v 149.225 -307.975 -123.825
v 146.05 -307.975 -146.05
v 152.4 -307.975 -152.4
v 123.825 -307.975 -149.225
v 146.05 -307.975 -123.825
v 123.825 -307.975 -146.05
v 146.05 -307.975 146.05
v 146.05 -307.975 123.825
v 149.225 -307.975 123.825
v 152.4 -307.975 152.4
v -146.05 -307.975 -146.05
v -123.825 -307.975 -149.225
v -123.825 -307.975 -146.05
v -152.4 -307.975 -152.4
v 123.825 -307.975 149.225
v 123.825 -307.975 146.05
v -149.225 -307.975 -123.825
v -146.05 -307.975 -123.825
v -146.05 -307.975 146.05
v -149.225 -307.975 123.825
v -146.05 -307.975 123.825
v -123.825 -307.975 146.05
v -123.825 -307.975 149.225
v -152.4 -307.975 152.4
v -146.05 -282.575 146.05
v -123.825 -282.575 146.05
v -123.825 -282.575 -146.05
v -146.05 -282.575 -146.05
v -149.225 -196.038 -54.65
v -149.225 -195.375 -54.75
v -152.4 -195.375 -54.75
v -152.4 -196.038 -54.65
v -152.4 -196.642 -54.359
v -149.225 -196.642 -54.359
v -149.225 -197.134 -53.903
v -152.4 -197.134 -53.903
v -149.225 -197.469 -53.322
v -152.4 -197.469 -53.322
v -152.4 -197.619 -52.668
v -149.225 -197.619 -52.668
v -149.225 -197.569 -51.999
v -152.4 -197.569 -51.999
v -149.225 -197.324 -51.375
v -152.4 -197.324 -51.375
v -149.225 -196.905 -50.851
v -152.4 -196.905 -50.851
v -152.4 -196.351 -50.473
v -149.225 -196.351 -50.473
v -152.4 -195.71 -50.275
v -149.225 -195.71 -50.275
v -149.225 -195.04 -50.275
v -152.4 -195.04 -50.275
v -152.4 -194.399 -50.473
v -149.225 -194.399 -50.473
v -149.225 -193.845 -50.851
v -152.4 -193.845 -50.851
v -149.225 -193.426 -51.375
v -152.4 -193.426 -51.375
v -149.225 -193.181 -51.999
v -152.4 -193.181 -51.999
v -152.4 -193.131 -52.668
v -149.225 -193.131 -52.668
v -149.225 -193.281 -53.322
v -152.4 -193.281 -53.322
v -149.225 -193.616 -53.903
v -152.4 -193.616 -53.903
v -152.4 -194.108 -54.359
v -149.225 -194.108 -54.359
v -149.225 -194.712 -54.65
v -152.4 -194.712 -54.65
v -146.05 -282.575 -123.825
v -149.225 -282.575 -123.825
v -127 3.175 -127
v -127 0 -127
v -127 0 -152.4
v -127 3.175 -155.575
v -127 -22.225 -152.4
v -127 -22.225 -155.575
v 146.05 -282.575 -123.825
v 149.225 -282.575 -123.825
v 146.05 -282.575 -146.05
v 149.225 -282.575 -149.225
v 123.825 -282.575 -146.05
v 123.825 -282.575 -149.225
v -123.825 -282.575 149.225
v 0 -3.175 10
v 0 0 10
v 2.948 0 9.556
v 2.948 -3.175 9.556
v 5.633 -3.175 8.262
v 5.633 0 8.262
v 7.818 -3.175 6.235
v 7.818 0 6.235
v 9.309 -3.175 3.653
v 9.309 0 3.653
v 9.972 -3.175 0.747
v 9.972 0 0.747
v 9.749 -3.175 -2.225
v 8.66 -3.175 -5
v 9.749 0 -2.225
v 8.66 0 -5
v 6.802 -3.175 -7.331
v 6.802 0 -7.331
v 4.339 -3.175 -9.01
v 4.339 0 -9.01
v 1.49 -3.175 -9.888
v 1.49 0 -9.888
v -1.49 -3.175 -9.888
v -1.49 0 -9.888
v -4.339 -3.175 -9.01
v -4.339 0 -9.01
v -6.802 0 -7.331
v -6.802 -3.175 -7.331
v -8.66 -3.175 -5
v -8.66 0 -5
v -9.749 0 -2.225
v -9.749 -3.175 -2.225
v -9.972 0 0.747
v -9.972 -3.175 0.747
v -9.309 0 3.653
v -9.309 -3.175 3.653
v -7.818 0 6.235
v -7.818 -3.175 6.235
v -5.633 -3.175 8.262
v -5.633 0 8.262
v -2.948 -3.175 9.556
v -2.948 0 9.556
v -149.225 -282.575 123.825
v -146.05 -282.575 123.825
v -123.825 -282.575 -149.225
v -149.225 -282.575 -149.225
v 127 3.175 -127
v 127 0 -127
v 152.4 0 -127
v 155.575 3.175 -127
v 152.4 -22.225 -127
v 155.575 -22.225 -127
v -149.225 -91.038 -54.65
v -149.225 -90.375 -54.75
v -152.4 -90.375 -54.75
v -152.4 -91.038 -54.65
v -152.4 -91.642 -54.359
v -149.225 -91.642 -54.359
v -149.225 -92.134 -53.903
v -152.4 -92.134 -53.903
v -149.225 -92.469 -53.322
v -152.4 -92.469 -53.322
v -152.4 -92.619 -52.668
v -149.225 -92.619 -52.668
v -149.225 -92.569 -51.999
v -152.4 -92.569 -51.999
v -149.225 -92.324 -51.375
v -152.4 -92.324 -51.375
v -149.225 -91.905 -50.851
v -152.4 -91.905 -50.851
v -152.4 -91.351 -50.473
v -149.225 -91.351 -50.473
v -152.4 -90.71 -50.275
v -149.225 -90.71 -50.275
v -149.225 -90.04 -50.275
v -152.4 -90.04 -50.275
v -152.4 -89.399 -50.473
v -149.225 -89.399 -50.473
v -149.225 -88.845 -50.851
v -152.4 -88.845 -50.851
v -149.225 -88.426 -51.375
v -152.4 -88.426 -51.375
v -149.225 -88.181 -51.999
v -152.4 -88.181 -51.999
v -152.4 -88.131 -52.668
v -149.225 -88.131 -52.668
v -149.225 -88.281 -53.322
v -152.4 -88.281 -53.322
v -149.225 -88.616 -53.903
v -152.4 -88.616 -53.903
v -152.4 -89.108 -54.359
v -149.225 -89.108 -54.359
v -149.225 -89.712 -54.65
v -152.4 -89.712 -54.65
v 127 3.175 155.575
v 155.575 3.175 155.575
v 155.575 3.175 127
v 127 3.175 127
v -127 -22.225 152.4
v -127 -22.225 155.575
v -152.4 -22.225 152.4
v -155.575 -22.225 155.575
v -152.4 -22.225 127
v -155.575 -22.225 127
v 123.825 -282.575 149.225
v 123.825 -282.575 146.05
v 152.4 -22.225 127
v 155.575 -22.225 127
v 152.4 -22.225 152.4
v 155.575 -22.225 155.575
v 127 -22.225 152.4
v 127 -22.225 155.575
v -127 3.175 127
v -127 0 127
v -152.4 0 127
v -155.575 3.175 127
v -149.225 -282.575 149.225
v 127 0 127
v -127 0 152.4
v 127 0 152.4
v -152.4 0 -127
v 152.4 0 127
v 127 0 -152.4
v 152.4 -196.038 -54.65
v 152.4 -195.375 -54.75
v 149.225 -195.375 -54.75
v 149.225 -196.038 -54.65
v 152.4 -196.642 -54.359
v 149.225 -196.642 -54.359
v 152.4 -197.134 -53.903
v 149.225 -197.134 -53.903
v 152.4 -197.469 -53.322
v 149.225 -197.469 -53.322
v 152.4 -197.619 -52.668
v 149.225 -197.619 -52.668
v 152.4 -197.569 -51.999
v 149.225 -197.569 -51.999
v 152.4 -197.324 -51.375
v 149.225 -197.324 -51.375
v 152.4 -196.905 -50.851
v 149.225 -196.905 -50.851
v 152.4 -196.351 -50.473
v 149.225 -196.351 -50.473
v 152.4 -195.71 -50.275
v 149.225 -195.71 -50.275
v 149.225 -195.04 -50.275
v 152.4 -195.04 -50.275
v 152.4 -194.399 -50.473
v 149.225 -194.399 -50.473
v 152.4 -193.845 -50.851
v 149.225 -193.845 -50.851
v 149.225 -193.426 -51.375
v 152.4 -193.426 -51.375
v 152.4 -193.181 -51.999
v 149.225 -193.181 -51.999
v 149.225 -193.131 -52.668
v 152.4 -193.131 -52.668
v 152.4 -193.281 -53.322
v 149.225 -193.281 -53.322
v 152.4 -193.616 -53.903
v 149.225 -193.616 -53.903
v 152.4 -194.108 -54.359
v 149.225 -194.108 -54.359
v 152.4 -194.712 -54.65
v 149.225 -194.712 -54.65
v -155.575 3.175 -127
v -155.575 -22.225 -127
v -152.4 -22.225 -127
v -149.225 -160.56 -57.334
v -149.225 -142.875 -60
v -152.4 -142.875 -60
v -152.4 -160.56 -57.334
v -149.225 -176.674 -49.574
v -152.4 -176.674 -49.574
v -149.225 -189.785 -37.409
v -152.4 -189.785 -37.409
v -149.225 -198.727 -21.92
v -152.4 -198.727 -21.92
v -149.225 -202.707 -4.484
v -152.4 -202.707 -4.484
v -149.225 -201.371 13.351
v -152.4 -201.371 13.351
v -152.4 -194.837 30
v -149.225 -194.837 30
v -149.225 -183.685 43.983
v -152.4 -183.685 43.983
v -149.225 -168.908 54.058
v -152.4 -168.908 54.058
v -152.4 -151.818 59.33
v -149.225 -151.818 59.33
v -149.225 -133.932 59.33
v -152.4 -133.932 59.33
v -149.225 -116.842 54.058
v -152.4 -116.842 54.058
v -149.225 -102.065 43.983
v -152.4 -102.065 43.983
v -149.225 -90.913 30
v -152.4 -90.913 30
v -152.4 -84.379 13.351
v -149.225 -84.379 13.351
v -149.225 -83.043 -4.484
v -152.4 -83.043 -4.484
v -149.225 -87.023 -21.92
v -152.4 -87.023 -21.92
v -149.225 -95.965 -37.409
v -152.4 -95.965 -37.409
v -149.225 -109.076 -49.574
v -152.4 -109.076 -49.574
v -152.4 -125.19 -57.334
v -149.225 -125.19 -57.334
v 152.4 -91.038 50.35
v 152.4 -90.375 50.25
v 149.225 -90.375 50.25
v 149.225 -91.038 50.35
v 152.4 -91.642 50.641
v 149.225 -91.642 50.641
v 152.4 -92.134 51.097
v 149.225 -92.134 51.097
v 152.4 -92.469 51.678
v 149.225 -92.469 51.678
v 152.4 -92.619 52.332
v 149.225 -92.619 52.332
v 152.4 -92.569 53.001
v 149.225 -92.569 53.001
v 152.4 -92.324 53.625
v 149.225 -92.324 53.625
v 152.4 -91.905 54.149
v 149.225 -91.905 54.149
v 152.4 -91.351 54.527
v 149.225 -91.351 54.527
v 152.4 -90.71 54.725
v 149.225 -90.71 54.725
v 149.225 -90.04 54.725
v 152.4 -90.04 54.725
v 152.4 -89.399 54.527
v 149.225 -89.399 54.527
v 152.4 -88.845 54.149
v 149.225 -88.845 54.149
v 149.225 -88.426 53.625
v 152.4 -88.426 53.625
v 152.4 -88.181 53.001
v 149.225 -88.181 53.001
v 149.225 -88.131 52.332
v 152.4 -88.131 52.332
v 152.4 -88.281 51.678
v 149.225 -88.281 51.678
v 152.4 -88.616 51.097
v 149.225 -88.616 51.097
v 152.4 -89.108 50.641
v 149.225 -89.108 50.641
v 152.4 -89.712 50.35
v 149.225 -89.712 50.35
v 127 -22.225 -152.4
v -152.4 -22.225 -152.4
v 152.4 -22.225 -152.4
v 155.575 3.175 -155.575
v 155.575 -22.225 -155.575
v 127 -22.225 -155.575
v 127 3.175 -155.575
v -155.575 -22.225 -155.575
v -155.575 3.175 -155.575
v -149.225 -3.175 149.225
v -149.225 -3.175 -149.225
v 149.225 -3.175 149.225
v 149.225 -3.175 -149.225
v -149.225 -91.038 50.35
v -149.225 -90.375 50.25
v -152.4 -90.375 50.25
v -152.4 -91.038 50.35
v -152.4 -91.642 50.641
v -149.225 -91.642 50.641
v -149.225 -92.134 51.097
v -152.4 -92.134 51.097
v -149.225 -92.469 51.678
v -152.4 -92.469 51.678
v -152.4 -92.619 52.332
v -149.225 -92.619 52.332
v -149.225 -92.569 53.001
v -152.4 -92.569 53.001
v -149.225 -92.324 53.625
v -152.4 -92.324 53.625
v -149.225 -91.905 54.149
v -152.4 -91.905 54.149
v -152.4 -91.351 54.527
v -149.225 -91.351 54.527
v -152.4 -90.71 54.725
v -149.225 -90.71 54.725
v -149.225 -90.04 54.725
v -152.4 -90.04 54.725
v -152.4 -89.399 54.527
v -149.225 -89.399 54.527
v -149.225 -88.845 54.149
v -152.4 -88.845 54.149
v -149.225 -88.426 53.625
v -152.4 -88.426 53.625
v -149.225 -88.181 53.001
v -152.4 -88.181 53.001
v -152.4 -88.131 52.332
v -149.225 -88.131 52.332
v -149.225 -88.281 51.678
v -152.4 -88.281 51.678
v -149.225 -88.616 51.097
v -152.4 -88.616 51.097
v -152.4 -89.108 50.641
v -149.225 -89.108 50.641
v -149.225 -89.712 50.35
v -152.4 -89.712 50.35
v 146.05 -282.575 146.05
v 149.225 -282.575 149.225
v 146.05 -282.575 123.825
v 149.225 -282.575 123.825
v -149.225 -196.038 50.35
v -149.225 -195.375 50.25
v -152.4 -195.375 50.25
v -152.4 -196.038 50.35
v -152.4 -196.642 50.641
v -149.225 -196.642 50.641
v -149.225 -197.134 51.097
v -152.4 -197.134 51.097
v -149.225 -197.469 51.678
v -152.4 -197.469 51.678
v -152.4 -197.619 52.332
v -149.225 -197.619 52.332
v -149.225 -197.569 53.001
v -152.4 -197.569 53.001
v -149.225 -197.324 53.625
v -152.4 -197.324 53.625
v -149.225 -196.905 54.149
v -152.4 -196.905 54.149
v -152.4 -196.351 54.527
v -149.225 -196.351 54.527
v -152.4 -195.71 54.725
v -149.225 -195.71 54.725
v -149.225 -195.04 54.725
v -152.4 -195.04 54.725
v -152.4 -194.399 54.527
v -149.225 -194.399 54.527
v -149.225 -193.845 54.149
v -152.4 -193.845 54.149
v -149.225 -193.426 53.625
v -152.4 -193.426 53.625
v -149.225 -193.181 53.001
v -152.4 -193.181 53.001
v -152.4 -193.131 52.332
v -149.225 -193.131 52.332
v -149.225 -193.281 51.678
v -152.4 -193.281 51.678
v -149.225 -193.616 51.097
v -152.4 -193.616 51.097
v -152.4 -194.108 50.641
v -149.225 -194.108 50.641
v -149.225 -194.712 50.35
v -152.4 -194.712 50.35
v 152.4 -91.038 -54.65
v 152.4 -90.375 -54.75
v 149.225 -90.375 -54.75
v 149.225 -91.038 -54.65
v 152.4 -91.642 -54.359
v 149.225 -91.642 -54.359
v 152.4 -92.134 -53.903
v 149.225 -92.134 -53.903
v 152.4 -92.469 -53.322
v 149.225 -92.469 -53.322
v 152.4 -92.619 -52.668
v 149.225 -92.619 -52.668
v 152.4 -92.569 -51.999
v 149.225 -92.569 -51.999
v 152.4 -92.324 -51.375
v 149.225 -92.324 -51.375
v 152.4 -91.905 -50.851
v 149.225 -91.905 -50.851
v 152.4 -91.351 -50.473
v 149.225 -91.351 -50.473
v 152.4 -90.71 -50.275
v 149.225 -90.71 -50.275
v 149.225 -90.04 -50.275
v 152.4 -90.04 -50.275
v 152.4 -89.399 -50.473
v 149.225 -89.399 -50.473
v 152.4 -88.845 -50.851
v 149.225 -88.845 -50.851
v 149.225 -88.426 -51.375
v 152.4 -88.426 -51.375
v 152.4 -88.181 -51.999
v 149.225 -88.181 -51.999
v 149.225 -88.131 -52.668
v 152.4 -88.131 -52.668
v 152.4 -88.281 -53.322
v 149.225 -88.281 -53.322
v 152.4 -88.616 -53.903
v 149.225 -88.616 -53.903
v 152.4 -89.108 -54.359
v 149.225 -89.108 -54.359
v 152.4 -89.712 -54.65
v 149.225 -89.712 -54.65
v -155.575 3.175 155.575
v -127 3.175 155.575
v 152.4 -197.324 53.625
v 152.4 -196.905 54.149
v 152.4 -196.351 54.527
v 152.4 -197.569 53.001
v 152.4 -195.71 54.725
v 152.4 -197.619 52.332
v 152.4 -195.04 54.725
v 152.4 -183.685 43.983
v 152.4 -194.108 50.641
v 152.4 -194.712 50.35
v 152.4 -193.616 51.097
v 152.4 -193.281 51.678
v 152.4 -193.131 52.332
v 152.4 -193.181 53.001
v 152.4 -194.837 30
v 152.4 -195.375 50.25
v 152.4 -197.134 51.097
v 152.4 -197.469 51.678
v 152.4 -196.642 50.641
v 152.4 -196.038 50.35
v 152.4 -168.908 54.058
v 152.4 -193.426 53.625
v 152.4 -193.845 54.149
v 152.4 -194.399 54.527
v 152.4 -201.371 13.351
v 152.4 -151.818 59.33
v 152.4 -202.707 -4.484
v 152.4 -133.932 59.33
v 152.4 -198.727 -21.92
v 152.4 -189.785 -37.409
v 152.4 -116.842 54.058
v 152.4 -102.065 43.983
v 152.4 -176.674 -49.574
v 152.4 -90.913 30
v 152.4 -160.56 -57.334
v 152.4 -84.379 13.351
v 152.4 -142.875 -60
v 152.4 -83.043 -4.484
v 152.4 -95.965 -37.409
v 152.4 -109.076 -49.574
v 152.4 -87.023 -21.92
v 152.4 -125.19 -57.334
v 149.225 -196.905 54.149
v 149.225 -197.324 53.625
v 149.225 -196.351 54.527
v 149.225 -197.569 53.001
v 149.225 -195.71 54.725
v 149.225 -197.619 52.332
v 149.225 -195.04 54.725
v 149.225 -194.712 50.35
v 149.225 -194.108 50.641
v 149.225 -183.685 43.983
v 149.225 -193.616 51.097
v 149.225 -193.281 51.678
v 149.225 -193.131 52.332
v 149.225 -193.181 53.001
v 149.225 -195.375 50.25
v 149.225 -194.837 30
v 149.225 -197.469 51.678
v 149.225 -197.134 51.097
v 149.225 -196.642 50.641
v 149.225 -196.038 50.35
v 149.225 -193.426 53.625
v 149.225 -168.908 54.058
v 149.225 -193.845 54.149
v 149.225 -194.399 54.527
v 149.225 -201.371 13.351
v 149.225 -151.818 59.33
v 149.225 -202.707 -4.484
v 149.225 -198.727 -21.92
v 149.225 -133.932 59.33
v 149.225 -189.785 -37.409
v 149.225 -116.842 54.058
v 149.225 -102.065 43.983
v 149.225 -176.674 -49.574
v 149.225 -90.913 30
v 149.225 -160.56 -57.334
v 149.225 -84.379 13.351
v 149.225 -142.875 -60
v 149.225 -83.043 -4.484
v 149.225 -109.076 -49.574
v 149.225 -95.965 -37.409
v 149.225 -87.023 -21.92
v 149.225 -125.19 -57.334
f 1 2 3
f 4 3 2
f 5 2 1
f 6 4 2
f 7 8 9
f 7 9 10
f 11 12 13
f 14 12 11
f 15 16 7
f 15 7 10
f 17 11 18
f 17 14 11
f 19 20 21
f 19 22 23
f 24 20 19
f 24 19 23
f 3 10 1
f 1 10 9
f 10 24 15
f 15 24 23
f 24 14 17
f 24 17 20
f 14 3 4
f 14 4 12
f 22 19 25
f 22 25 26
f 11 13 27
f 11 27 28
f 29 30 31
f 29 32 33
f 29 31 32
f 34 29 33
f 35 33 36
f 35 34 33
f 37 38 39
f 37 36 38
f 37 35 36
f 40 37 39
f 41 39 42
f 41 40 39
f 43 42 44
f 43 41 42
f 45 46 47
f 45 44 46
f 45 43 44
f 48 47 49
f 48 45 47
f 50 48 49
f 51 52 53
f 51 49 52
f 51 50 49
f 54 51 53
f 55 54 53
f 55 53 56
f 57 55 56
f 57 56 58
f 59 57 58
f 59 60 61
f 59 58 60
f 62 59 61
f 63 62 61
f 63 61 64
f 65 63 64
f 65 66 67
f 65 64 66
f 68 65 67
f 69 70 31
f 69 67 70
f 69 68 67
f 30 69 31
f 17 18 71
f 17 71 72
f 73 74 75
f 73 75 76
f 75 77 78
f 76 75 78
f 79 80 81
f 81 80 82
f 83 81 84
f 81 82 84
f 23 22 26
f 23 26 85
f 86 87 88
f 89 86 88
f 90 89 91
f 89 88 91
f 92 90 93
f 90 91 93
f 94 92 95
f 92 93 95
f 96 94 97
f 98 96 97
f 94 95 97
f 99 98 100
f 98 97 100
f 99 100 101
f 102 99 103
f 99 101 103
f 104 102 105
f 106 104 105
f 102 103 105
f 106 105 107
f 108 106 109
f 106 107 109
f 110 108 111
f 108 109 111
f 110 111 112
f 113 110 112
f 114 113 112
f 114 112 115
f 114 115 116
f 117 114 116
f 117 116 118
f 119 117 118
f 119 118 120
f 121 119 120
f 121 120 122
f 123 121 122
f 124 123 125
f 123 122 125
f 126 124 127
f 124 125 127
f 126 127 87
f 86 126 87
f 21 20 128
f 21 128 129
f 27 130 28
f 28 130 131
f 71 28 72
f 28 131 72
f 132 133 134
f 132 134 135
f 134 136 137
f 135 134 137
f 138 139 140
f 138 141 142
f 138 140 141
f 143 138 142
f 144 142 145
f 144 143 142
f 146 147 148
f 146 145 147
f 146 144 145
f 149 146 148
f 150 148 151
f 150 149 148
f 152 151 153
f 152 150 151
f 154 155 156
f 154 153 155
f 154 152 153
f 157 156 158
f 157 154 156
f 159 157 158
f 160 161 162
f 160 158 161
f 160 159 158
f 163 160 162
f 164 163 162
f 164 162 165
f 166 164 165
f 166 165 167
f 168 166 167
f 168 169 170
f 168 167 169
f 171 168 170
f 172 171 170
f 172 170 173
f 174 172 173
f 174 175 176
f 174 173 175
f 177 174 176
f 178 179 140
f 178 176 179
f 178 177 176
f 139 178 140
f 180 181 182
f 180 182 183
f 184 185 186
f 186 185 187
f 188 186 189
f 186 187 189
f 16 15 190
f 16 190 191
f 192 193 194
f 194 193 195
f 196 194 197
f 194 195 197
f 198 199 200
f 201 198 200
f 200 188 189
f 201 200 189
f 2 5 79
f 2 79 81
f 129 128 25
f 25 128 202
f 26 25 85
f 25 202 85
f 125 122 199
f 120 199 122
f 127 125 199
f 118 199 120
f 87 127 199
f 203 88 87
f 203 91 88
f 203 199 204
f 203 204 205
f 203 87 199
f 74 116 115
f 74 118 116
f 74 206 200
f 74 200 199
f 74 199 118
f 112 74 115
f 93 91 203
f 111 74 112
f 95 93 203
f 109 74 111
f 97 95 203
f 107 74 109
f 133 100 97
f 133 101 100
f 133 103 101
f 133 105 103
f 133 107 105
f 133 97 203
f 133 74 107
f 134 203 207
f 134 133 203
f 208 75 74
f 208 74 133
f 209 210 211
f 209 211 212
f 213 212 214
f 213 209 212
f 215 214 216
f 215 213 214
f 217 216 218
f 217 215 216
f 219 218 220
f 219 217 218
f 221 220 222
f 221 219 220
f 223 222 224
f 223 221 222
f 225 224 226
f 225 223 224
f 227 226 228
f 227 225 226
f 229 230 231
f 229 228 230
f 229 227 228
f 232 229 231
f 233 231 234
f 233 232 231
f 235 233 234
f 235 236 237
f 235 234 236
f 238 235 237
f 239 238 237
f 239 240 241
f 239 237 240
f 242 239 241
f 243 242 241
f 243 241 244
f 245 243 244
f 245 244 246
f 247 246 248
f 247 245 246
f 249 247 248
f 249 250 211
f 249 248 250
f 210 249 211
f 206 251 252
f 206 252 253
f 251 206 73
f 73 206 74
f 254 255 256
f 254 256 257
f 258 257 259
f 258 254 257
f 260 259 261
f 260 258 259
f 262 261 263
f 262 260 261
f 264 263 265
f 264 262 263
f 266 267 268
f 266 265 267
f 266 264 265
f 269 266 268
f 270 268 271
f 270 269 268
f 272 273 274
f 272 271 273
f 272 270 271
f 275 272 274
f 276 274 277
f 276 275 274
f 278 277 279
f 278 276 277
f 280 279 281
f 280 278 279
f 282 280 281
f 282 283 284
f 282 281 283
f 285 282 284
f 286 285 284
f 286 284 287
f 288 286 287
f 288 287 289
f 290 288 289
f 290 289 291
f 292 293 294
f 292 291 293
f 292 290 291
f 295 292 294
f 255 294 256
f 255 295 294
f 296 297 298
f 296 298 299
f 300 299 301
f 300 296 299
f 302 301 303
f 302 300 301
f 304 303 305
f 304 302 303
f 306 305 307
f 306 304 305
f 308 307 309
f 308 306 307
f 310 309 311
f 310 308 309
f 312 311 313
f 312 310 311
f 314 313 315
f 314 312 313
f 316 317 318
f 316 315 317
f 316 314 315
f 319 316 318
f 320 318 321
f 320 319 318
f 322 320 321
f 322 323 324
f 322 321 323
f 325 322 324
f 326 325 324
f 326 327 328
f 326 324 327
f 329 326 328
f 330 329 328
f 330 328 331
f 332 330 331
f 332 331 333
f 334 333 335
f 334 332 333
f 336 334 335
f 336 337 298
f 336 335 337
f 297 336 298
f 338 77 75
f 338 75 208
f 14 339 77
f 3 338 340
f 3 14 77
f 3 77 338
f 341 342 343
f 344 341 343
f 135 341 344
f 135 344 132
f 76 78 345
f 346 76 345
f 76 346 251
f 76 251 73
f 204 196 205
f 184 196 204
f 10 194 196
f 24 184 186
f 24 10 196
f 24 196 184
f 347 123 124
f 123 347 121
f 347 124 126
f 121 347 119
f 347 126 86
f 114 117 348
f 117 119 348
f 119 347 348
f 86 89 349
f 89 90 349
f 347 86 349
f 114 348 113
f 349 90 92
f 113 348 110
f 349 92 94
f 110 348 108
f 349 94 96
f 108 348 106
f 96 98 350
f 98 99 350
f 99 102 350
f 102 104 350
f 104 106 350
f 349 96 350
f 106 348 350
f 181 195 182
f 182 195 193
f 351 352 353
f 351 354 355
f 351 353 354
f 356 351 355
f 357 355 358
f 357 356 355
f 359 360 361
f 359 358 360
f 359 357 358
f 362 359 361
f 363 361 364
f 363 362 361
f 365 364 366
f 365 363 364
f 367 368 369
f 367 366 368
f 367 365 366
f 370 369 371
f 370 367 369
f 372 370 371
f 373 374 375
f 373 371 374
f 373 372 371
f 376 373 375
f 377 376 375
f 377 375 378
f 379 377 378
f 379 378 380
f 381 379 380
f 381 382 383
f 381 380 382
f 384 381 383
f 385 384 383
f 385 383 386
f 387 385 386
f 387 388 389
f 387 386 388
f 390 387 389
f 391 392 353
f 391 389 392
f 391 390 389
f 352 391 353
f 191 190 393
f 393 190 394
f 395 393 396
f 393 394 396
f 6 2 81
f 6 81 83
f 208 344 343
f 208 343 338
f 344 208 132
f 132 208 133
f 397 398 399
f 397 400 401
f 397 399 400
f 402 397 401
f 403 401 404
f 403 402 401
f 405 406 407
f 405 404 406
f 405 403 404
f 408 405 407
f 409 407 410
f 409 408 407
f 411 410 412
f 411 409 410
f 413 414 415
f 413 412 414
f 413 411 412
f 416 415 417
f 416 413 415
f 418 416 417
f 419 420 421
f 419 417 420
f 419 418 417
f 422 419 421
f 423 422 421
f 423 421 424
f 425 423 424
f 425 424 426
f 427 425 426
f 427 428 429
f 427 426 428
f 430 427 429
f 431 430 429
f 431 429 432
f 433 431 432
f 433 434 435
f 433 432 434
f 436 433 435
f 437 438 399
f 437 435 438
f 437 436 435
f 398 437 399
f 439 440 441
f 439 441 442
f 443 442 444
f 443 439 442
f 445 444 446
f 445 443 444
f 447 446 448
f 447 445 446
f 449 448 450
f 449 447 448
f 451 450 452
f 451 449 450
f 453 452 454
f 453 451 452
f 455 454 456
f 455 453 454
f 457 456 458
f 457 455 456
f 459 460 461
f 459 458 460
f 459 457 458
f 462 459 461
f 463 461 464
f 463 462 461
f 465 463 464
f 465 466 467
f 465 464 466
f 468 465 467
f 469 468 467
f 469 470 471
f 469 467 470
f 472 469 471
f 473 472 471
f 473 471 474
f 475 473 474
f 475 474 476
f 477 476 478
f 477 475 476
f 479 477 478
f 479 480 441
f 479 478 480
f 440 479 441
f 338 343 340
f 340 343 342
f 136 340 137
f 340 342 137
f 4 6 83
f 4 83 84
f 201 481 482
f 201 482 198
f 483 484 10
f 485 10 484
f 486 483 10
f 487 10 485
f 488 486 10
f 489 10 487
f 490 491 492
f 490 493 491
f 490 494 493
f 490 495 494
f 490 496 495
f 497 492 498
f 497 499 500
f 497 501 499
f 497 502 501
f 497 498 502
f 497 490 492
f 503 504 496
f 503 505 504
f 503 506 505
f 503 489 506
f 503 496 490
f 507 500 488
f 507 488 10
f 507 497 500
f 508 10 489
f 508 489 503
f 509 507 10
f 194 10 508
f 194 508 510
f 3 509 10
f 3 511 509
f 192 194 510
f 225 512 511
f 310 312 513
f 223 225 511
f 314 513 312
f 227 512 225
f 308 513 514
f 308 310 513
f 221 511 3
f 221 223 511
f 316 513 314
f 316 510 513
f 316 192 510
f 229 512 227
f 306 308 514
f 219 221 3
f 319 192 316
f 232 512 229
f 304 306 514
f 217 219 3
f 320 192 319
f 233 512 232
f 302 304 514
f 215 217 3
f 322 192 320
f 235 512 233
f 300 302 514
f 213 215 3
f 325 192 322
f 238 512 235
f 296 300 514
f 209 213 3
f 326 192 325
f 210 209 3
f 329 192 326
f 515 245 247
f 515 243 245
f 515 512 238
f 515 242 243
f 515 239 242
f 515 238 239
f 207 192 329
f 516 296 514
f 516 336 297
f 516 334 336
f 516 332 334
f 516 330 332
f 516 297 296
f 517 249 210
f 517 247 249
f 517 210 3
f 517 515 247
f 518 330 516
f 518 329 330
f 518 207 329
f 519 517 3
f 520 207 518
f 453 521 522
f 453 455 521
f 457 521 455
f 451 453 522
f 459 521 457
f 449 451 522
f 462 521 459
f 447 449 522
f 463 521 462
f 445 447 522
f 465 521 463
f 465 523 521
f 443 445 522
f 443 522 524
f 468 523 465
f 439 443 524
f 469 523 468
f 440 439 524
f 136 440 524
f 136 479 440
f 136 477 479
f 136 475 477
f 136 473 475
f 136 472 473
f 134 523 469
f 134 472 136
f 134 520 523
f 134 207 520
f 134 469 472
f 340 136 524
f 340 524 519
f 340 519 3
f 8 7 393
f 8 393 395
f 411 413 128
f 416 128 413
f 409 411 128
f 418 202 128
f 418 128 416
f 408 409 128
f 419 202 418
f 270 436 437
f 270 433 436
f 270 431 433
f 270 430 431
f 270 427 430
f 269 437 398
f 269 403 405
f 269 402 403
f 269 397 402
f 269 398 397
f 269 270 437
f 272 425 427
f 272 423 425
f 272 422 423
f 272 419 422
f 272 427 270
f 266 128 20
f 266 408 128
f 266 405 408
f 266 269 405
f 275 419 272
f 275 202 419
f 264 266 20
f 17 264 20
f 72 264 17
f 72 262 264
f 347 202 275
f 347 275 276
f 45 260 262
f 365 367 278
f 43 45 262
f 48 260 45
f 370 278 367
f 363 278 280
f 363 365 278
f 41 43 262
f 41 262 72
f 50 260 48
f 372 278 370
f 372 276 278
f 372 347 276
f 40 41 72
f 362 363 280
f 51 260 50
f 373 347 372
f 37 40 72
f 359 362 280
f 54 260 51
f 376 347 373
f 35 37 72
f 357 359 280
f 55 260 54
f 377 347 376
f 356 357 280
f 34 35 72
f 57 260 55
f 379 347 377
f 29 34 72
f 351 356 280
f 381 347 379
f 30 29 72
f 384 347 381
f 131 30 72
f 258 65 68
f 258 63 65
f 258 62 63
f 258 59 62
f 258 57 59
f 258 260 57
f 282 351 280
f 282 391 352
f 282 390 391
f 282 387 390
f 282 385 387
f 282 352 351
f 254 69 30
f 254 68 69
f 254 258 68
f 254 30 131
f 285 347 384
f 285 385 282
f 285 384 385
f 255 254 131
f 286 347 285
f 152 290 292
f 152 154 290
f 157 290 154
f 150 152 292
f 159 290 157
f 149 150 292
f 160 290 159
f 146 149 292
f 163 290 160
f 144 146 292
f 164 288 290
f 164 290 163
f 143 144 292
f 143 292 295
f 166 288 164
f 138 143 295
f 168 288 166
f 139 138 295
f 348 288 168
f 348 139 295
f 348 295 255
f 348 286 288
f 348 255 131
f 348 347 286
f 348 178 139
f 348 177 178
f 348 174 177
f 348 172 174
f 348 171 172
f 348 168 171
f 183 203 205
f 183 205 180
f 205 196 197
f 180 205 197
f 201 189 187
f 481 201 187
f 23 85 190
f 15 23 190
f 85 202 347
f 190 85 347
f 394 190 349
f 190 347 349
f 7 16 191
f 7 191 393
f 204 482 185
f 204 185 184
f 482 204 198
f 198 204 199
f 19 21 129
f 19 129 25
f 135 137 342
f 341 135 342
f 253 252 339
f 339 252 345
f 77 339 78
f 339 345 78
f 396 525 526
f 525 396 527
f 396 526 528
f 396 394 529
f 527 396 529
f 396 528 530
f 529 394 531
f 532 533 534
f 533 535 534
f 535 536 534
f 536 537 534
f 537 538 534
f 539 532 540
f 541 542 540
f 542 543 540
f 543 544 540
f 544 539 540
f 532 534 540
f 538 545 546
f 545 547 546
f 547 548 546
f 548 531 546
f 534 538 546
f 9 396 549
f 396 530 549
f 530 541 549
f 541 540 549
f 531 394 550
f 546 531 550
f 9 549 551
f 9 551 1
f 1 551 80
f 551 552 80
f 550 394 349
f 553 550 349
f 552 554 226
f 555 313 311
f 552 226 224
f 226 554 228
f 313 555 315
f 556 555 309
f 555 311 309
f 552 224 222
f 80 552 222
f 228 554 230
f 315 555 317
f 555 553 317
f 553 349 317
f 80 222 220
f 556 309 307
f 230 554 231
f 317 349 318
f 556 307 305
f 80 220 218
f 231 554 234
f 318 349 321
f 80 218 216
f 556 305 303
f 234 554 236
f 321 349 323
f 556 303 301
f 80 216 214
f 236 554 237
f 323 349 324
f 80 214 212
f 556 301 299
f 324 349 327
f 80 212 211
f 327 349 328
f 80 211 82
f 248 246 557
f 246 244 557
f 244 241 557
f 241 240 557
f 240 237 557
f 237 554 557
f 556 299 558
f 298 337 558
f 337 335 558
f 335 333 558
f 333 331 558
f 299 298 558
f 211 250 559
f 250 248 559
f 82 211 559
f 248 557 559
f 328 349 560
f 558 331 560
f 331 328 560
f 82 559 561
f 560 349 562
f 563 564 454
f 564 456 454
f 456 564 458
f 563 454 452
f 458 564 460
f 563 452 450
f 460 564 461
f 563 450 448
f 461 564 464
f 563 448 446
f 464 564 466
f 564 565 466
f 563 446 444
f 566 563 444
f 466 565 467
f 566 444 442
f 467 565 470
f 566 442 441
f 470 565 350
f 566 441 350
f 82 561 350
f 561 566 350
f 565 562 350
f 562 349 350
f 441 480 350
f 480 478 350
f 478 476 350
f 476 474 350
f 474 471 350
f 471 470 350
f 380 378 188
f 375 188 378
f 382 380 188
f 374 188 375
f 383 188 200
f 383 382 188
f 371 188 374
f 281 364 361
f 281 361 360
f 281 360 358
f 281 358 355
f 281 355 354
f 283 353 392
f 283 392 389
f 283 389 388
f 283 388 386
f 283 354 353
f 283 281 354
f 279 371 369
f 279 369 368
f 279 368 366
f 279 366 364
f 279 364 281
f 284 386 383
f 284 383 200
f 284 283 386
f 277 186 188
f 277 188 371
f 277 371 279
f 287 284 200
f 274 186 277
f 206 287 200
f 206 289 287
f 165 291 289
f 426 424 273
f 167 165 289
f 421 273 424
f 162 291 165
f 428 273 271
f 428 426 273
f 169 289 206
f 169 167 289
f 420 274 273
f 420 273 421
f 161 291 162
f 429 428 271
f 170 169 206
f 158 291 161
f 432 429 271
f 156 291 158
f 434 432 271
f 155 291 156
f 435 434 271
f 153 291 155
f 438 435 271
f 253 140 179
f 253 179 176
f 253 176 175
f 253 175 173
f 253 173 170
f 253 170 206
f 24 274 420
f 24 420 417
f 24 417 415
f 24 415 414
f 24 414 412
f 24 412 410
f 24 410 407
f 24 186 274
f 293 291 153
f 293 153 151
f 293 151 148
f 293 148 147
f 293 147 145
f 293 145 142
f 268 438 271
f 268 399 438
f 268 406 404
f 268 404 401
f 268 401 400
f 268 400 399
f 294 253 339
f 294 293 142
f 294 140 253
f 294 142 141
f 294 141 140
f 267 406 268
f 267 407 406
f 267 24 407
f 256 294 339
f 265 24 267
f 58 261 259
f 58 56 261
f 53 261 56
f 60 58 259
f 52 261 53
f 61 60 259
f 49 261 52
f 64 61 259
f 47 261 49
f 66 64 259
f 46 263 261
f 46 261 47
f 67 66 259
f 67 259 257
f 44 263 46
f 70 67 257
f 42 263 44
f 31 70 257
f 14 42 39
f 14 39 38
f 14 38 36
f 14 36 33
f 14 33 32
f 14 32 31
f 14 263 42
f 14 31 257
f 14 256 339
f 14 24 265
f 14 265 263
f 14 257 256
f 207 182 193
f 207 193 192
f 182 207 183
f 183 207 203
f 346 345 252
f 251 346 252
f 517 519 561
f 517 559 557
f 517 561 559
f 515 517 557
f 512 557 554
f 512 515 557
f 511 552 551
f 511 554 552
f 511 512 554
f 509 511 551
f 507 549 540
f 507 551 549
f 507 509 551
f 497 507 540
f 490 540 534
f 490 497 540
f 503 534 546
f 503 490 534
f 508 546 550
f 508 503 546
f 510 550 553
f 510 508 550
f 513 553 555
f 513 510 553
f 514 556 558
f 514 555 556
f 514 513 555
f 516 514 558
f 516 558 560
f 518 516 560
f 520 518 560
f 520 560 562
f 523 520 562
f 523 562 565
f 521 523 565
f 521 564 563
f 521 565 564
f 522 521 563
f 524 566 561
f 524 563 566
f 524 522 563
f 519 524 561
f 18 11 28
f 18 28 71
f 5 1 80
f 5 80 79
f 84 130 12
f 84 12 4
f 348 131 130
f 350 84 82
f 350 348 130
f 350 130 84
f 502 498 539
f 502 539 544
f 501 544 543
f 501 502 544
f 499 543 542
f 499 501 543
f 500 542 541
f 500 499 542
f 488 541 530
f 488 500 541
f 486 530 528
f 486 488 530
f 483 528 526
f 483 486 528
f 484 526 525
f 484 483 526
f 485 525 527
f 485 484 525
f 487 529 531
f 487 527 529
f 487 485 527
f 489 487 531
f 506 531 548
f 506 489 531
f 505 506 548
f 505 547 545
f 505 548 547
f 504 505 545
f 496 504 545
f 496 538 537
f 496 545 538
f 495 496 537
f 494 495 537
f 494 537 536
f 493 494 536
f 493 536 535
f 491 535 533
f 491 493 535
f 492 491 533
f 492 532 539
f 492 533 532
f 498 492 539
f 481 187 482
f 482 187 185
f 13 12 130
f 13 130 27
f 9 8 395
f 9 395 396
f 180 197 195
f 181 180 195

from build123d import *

# Parameters (mm, degrees)
SKETCH1_W               = 304.8
SKETCH1_H               = 304.8
SKETCH1_R               = 10
BOSS_EXTRUDE1_DEPTH     = 3.175
SKETCH1_3_W             = 304.8
SKETCH1_3_H             = 304.8
SKETCH1_3_W_2           = 298.45
SKETCH1_3_H_2           = 298.45
BOSS_EXTRUDE2_DEPTH     = 307.975
SKETCH3_W               = 25.4
SKETCH3_H               = 25.4
BOSS_EXTRUDE3_DEPTH     = 3.175
BOSS_EXTRUDE4_START     = -22.225
BOSS_EXTRUDE4_DEPTH     = 25.4
CIRPATTERN1_COUNT       = 4
BOSS_EXTRUDE5_DEPTH     = 25.4
CIRPATTERN2_COUNT       = 4
CUT_EXTRUDE1_DEPTH      = 461.385948146
CUT_EXTRUDE1_DEPTH_BACK = 461.385948146
SKETCH6_R               = 60
SKETCH6_R_2             = 2.25


with BuildPart() as part:
    # Sketch1 → Boss-Extrude1 (new body)
    with BuildSketch(Plane(origin=(0, 0, 0), x_dir=(1, 0, 0), z_dir=(0, 1, 0))):
        Rectangle(SKETCH1_W, SKETCH1_H)
        Circle(SKETCH1_R, mode=Mode.SUBTRACT)
    extrude(amount=-BOSS_EXTRUDE1_DEPTH)

    # Sketch1<3> → Boss-Extrude2 (add)
    with BuildSketch(Plane(origin=(0, 0, 0), x_dir=(1, 0, 0), z_dir=(0, 1, 0))):
        Rectangle(SKETCH1_3_W, SKETCH1_3_H)
        Rectangle(SKETCH1_3_W_2, SKETCH1_3_H_2, mode=Mode.SUBTRACT)
    extrude(amount=-BOSS_EXTRUDE2_DEPTH)

    # Sketch3 → Boss-Extrude3 (add)
    with BuildSketch(Plane(origin=(0, 0, 0), x_dir=(1, 0, 0), z_dir=(0, 1, 0))):
        with Locations((-139.7, 139.7)):
            Rectangle(SKETCH3_W, SKETCH3_H)
    boss_extrude3 = extrude(amount=BOSS_EXTRUDE3_DEPTH)

    # Sketch3<3> → Boss-Extrude4 (add)
    with BuildSketch(Plane(origin=(0, 0, 0), x_dir=(1, 0, 0), z_dir=(0, 1, 0)).offset(BOSS_EXTRUDE4_START)):
        Polygon((-152.4, 127), (-152.4, 152.4), (-127, 152.4), (-127, 155.575), (-155.575, 155.575), (-155.575, 127), align=None)
    boss_extrude4 = extrude(amount=BOSS_EXTRUDE4_DEPTH)

    # CirPattern1: Boss-Extrude3, Boss-Extrude4 ×4 about axis
    cirpattern1_axis = Axis((0, 0, 0), (0, 1, 0))
    add([boss_extrude3.rotate(cirpattern1_axis, i * 360 / CIRPATTERN1_COUNT) for i in range(1, CIRPATTERN1_COUNT)])
    add([boss_extrude4.rotate(cirpattern1_axis, i * 360 / CIRPATTERN1_COUNT) for i in range(1, CIRPATTERN1_COUNT)])

    # Sketch5 → Boss-Extrude5 (add)
    with BuildSketch(Plane.XZ.offset(307.975)):
        Polygon((-149.225, 123.825), (-146.05, 123.825), (-146.05, 146.05), (-123.825, 146.05), (-123.825, 149.225), (-149.225, 149.225), align=None)
    boss_extrude5 = extrude(amount=-BOSS_EXTRUDE5_DEPTH)

    # CirPattern2: Boss-Extrude5 ×4 about axis
    cirpattern2_axis = Axis((0, 0, 0), (0, 1, 0))
    for i in range(1, CIRPATTERN2_COUNT):
        add(boss_extrude5.rotate(cirpattern2_axis, i * 360 / CIRPATTERN2_COUNT))

    # Sketch6 → Cut-Extrude1 (cut, two sides: drawn at the far end of the back side and taken through both)
    with BuildSketch(Plane.ZY.offset(-149.225).offset(-CUT_EXTRUDE1_DEPTH_BACK)):
        with Locations((0, -142.875)):
            Circle(SKETCH6_R)
        with Locations((-52.5, -90.375)):
            Circle(SKETCH6_R_2)
        with Locations((52.5, -90.375)):
            Circle(SKETCH6_R_2)
        with Locations((52.5, -195.375)):
            Circle(SKETCH6_R_2)
        with Locations((-52.5, -195.375)):
            Circle(SKETCH6_R_2)
    extrude(amount=CUT_EXTRUDE1_DEPTH + CUT_EXTRUDE1_DEPTH_BACK, mode=Mode.SUBTRACT)


solid = part.part
